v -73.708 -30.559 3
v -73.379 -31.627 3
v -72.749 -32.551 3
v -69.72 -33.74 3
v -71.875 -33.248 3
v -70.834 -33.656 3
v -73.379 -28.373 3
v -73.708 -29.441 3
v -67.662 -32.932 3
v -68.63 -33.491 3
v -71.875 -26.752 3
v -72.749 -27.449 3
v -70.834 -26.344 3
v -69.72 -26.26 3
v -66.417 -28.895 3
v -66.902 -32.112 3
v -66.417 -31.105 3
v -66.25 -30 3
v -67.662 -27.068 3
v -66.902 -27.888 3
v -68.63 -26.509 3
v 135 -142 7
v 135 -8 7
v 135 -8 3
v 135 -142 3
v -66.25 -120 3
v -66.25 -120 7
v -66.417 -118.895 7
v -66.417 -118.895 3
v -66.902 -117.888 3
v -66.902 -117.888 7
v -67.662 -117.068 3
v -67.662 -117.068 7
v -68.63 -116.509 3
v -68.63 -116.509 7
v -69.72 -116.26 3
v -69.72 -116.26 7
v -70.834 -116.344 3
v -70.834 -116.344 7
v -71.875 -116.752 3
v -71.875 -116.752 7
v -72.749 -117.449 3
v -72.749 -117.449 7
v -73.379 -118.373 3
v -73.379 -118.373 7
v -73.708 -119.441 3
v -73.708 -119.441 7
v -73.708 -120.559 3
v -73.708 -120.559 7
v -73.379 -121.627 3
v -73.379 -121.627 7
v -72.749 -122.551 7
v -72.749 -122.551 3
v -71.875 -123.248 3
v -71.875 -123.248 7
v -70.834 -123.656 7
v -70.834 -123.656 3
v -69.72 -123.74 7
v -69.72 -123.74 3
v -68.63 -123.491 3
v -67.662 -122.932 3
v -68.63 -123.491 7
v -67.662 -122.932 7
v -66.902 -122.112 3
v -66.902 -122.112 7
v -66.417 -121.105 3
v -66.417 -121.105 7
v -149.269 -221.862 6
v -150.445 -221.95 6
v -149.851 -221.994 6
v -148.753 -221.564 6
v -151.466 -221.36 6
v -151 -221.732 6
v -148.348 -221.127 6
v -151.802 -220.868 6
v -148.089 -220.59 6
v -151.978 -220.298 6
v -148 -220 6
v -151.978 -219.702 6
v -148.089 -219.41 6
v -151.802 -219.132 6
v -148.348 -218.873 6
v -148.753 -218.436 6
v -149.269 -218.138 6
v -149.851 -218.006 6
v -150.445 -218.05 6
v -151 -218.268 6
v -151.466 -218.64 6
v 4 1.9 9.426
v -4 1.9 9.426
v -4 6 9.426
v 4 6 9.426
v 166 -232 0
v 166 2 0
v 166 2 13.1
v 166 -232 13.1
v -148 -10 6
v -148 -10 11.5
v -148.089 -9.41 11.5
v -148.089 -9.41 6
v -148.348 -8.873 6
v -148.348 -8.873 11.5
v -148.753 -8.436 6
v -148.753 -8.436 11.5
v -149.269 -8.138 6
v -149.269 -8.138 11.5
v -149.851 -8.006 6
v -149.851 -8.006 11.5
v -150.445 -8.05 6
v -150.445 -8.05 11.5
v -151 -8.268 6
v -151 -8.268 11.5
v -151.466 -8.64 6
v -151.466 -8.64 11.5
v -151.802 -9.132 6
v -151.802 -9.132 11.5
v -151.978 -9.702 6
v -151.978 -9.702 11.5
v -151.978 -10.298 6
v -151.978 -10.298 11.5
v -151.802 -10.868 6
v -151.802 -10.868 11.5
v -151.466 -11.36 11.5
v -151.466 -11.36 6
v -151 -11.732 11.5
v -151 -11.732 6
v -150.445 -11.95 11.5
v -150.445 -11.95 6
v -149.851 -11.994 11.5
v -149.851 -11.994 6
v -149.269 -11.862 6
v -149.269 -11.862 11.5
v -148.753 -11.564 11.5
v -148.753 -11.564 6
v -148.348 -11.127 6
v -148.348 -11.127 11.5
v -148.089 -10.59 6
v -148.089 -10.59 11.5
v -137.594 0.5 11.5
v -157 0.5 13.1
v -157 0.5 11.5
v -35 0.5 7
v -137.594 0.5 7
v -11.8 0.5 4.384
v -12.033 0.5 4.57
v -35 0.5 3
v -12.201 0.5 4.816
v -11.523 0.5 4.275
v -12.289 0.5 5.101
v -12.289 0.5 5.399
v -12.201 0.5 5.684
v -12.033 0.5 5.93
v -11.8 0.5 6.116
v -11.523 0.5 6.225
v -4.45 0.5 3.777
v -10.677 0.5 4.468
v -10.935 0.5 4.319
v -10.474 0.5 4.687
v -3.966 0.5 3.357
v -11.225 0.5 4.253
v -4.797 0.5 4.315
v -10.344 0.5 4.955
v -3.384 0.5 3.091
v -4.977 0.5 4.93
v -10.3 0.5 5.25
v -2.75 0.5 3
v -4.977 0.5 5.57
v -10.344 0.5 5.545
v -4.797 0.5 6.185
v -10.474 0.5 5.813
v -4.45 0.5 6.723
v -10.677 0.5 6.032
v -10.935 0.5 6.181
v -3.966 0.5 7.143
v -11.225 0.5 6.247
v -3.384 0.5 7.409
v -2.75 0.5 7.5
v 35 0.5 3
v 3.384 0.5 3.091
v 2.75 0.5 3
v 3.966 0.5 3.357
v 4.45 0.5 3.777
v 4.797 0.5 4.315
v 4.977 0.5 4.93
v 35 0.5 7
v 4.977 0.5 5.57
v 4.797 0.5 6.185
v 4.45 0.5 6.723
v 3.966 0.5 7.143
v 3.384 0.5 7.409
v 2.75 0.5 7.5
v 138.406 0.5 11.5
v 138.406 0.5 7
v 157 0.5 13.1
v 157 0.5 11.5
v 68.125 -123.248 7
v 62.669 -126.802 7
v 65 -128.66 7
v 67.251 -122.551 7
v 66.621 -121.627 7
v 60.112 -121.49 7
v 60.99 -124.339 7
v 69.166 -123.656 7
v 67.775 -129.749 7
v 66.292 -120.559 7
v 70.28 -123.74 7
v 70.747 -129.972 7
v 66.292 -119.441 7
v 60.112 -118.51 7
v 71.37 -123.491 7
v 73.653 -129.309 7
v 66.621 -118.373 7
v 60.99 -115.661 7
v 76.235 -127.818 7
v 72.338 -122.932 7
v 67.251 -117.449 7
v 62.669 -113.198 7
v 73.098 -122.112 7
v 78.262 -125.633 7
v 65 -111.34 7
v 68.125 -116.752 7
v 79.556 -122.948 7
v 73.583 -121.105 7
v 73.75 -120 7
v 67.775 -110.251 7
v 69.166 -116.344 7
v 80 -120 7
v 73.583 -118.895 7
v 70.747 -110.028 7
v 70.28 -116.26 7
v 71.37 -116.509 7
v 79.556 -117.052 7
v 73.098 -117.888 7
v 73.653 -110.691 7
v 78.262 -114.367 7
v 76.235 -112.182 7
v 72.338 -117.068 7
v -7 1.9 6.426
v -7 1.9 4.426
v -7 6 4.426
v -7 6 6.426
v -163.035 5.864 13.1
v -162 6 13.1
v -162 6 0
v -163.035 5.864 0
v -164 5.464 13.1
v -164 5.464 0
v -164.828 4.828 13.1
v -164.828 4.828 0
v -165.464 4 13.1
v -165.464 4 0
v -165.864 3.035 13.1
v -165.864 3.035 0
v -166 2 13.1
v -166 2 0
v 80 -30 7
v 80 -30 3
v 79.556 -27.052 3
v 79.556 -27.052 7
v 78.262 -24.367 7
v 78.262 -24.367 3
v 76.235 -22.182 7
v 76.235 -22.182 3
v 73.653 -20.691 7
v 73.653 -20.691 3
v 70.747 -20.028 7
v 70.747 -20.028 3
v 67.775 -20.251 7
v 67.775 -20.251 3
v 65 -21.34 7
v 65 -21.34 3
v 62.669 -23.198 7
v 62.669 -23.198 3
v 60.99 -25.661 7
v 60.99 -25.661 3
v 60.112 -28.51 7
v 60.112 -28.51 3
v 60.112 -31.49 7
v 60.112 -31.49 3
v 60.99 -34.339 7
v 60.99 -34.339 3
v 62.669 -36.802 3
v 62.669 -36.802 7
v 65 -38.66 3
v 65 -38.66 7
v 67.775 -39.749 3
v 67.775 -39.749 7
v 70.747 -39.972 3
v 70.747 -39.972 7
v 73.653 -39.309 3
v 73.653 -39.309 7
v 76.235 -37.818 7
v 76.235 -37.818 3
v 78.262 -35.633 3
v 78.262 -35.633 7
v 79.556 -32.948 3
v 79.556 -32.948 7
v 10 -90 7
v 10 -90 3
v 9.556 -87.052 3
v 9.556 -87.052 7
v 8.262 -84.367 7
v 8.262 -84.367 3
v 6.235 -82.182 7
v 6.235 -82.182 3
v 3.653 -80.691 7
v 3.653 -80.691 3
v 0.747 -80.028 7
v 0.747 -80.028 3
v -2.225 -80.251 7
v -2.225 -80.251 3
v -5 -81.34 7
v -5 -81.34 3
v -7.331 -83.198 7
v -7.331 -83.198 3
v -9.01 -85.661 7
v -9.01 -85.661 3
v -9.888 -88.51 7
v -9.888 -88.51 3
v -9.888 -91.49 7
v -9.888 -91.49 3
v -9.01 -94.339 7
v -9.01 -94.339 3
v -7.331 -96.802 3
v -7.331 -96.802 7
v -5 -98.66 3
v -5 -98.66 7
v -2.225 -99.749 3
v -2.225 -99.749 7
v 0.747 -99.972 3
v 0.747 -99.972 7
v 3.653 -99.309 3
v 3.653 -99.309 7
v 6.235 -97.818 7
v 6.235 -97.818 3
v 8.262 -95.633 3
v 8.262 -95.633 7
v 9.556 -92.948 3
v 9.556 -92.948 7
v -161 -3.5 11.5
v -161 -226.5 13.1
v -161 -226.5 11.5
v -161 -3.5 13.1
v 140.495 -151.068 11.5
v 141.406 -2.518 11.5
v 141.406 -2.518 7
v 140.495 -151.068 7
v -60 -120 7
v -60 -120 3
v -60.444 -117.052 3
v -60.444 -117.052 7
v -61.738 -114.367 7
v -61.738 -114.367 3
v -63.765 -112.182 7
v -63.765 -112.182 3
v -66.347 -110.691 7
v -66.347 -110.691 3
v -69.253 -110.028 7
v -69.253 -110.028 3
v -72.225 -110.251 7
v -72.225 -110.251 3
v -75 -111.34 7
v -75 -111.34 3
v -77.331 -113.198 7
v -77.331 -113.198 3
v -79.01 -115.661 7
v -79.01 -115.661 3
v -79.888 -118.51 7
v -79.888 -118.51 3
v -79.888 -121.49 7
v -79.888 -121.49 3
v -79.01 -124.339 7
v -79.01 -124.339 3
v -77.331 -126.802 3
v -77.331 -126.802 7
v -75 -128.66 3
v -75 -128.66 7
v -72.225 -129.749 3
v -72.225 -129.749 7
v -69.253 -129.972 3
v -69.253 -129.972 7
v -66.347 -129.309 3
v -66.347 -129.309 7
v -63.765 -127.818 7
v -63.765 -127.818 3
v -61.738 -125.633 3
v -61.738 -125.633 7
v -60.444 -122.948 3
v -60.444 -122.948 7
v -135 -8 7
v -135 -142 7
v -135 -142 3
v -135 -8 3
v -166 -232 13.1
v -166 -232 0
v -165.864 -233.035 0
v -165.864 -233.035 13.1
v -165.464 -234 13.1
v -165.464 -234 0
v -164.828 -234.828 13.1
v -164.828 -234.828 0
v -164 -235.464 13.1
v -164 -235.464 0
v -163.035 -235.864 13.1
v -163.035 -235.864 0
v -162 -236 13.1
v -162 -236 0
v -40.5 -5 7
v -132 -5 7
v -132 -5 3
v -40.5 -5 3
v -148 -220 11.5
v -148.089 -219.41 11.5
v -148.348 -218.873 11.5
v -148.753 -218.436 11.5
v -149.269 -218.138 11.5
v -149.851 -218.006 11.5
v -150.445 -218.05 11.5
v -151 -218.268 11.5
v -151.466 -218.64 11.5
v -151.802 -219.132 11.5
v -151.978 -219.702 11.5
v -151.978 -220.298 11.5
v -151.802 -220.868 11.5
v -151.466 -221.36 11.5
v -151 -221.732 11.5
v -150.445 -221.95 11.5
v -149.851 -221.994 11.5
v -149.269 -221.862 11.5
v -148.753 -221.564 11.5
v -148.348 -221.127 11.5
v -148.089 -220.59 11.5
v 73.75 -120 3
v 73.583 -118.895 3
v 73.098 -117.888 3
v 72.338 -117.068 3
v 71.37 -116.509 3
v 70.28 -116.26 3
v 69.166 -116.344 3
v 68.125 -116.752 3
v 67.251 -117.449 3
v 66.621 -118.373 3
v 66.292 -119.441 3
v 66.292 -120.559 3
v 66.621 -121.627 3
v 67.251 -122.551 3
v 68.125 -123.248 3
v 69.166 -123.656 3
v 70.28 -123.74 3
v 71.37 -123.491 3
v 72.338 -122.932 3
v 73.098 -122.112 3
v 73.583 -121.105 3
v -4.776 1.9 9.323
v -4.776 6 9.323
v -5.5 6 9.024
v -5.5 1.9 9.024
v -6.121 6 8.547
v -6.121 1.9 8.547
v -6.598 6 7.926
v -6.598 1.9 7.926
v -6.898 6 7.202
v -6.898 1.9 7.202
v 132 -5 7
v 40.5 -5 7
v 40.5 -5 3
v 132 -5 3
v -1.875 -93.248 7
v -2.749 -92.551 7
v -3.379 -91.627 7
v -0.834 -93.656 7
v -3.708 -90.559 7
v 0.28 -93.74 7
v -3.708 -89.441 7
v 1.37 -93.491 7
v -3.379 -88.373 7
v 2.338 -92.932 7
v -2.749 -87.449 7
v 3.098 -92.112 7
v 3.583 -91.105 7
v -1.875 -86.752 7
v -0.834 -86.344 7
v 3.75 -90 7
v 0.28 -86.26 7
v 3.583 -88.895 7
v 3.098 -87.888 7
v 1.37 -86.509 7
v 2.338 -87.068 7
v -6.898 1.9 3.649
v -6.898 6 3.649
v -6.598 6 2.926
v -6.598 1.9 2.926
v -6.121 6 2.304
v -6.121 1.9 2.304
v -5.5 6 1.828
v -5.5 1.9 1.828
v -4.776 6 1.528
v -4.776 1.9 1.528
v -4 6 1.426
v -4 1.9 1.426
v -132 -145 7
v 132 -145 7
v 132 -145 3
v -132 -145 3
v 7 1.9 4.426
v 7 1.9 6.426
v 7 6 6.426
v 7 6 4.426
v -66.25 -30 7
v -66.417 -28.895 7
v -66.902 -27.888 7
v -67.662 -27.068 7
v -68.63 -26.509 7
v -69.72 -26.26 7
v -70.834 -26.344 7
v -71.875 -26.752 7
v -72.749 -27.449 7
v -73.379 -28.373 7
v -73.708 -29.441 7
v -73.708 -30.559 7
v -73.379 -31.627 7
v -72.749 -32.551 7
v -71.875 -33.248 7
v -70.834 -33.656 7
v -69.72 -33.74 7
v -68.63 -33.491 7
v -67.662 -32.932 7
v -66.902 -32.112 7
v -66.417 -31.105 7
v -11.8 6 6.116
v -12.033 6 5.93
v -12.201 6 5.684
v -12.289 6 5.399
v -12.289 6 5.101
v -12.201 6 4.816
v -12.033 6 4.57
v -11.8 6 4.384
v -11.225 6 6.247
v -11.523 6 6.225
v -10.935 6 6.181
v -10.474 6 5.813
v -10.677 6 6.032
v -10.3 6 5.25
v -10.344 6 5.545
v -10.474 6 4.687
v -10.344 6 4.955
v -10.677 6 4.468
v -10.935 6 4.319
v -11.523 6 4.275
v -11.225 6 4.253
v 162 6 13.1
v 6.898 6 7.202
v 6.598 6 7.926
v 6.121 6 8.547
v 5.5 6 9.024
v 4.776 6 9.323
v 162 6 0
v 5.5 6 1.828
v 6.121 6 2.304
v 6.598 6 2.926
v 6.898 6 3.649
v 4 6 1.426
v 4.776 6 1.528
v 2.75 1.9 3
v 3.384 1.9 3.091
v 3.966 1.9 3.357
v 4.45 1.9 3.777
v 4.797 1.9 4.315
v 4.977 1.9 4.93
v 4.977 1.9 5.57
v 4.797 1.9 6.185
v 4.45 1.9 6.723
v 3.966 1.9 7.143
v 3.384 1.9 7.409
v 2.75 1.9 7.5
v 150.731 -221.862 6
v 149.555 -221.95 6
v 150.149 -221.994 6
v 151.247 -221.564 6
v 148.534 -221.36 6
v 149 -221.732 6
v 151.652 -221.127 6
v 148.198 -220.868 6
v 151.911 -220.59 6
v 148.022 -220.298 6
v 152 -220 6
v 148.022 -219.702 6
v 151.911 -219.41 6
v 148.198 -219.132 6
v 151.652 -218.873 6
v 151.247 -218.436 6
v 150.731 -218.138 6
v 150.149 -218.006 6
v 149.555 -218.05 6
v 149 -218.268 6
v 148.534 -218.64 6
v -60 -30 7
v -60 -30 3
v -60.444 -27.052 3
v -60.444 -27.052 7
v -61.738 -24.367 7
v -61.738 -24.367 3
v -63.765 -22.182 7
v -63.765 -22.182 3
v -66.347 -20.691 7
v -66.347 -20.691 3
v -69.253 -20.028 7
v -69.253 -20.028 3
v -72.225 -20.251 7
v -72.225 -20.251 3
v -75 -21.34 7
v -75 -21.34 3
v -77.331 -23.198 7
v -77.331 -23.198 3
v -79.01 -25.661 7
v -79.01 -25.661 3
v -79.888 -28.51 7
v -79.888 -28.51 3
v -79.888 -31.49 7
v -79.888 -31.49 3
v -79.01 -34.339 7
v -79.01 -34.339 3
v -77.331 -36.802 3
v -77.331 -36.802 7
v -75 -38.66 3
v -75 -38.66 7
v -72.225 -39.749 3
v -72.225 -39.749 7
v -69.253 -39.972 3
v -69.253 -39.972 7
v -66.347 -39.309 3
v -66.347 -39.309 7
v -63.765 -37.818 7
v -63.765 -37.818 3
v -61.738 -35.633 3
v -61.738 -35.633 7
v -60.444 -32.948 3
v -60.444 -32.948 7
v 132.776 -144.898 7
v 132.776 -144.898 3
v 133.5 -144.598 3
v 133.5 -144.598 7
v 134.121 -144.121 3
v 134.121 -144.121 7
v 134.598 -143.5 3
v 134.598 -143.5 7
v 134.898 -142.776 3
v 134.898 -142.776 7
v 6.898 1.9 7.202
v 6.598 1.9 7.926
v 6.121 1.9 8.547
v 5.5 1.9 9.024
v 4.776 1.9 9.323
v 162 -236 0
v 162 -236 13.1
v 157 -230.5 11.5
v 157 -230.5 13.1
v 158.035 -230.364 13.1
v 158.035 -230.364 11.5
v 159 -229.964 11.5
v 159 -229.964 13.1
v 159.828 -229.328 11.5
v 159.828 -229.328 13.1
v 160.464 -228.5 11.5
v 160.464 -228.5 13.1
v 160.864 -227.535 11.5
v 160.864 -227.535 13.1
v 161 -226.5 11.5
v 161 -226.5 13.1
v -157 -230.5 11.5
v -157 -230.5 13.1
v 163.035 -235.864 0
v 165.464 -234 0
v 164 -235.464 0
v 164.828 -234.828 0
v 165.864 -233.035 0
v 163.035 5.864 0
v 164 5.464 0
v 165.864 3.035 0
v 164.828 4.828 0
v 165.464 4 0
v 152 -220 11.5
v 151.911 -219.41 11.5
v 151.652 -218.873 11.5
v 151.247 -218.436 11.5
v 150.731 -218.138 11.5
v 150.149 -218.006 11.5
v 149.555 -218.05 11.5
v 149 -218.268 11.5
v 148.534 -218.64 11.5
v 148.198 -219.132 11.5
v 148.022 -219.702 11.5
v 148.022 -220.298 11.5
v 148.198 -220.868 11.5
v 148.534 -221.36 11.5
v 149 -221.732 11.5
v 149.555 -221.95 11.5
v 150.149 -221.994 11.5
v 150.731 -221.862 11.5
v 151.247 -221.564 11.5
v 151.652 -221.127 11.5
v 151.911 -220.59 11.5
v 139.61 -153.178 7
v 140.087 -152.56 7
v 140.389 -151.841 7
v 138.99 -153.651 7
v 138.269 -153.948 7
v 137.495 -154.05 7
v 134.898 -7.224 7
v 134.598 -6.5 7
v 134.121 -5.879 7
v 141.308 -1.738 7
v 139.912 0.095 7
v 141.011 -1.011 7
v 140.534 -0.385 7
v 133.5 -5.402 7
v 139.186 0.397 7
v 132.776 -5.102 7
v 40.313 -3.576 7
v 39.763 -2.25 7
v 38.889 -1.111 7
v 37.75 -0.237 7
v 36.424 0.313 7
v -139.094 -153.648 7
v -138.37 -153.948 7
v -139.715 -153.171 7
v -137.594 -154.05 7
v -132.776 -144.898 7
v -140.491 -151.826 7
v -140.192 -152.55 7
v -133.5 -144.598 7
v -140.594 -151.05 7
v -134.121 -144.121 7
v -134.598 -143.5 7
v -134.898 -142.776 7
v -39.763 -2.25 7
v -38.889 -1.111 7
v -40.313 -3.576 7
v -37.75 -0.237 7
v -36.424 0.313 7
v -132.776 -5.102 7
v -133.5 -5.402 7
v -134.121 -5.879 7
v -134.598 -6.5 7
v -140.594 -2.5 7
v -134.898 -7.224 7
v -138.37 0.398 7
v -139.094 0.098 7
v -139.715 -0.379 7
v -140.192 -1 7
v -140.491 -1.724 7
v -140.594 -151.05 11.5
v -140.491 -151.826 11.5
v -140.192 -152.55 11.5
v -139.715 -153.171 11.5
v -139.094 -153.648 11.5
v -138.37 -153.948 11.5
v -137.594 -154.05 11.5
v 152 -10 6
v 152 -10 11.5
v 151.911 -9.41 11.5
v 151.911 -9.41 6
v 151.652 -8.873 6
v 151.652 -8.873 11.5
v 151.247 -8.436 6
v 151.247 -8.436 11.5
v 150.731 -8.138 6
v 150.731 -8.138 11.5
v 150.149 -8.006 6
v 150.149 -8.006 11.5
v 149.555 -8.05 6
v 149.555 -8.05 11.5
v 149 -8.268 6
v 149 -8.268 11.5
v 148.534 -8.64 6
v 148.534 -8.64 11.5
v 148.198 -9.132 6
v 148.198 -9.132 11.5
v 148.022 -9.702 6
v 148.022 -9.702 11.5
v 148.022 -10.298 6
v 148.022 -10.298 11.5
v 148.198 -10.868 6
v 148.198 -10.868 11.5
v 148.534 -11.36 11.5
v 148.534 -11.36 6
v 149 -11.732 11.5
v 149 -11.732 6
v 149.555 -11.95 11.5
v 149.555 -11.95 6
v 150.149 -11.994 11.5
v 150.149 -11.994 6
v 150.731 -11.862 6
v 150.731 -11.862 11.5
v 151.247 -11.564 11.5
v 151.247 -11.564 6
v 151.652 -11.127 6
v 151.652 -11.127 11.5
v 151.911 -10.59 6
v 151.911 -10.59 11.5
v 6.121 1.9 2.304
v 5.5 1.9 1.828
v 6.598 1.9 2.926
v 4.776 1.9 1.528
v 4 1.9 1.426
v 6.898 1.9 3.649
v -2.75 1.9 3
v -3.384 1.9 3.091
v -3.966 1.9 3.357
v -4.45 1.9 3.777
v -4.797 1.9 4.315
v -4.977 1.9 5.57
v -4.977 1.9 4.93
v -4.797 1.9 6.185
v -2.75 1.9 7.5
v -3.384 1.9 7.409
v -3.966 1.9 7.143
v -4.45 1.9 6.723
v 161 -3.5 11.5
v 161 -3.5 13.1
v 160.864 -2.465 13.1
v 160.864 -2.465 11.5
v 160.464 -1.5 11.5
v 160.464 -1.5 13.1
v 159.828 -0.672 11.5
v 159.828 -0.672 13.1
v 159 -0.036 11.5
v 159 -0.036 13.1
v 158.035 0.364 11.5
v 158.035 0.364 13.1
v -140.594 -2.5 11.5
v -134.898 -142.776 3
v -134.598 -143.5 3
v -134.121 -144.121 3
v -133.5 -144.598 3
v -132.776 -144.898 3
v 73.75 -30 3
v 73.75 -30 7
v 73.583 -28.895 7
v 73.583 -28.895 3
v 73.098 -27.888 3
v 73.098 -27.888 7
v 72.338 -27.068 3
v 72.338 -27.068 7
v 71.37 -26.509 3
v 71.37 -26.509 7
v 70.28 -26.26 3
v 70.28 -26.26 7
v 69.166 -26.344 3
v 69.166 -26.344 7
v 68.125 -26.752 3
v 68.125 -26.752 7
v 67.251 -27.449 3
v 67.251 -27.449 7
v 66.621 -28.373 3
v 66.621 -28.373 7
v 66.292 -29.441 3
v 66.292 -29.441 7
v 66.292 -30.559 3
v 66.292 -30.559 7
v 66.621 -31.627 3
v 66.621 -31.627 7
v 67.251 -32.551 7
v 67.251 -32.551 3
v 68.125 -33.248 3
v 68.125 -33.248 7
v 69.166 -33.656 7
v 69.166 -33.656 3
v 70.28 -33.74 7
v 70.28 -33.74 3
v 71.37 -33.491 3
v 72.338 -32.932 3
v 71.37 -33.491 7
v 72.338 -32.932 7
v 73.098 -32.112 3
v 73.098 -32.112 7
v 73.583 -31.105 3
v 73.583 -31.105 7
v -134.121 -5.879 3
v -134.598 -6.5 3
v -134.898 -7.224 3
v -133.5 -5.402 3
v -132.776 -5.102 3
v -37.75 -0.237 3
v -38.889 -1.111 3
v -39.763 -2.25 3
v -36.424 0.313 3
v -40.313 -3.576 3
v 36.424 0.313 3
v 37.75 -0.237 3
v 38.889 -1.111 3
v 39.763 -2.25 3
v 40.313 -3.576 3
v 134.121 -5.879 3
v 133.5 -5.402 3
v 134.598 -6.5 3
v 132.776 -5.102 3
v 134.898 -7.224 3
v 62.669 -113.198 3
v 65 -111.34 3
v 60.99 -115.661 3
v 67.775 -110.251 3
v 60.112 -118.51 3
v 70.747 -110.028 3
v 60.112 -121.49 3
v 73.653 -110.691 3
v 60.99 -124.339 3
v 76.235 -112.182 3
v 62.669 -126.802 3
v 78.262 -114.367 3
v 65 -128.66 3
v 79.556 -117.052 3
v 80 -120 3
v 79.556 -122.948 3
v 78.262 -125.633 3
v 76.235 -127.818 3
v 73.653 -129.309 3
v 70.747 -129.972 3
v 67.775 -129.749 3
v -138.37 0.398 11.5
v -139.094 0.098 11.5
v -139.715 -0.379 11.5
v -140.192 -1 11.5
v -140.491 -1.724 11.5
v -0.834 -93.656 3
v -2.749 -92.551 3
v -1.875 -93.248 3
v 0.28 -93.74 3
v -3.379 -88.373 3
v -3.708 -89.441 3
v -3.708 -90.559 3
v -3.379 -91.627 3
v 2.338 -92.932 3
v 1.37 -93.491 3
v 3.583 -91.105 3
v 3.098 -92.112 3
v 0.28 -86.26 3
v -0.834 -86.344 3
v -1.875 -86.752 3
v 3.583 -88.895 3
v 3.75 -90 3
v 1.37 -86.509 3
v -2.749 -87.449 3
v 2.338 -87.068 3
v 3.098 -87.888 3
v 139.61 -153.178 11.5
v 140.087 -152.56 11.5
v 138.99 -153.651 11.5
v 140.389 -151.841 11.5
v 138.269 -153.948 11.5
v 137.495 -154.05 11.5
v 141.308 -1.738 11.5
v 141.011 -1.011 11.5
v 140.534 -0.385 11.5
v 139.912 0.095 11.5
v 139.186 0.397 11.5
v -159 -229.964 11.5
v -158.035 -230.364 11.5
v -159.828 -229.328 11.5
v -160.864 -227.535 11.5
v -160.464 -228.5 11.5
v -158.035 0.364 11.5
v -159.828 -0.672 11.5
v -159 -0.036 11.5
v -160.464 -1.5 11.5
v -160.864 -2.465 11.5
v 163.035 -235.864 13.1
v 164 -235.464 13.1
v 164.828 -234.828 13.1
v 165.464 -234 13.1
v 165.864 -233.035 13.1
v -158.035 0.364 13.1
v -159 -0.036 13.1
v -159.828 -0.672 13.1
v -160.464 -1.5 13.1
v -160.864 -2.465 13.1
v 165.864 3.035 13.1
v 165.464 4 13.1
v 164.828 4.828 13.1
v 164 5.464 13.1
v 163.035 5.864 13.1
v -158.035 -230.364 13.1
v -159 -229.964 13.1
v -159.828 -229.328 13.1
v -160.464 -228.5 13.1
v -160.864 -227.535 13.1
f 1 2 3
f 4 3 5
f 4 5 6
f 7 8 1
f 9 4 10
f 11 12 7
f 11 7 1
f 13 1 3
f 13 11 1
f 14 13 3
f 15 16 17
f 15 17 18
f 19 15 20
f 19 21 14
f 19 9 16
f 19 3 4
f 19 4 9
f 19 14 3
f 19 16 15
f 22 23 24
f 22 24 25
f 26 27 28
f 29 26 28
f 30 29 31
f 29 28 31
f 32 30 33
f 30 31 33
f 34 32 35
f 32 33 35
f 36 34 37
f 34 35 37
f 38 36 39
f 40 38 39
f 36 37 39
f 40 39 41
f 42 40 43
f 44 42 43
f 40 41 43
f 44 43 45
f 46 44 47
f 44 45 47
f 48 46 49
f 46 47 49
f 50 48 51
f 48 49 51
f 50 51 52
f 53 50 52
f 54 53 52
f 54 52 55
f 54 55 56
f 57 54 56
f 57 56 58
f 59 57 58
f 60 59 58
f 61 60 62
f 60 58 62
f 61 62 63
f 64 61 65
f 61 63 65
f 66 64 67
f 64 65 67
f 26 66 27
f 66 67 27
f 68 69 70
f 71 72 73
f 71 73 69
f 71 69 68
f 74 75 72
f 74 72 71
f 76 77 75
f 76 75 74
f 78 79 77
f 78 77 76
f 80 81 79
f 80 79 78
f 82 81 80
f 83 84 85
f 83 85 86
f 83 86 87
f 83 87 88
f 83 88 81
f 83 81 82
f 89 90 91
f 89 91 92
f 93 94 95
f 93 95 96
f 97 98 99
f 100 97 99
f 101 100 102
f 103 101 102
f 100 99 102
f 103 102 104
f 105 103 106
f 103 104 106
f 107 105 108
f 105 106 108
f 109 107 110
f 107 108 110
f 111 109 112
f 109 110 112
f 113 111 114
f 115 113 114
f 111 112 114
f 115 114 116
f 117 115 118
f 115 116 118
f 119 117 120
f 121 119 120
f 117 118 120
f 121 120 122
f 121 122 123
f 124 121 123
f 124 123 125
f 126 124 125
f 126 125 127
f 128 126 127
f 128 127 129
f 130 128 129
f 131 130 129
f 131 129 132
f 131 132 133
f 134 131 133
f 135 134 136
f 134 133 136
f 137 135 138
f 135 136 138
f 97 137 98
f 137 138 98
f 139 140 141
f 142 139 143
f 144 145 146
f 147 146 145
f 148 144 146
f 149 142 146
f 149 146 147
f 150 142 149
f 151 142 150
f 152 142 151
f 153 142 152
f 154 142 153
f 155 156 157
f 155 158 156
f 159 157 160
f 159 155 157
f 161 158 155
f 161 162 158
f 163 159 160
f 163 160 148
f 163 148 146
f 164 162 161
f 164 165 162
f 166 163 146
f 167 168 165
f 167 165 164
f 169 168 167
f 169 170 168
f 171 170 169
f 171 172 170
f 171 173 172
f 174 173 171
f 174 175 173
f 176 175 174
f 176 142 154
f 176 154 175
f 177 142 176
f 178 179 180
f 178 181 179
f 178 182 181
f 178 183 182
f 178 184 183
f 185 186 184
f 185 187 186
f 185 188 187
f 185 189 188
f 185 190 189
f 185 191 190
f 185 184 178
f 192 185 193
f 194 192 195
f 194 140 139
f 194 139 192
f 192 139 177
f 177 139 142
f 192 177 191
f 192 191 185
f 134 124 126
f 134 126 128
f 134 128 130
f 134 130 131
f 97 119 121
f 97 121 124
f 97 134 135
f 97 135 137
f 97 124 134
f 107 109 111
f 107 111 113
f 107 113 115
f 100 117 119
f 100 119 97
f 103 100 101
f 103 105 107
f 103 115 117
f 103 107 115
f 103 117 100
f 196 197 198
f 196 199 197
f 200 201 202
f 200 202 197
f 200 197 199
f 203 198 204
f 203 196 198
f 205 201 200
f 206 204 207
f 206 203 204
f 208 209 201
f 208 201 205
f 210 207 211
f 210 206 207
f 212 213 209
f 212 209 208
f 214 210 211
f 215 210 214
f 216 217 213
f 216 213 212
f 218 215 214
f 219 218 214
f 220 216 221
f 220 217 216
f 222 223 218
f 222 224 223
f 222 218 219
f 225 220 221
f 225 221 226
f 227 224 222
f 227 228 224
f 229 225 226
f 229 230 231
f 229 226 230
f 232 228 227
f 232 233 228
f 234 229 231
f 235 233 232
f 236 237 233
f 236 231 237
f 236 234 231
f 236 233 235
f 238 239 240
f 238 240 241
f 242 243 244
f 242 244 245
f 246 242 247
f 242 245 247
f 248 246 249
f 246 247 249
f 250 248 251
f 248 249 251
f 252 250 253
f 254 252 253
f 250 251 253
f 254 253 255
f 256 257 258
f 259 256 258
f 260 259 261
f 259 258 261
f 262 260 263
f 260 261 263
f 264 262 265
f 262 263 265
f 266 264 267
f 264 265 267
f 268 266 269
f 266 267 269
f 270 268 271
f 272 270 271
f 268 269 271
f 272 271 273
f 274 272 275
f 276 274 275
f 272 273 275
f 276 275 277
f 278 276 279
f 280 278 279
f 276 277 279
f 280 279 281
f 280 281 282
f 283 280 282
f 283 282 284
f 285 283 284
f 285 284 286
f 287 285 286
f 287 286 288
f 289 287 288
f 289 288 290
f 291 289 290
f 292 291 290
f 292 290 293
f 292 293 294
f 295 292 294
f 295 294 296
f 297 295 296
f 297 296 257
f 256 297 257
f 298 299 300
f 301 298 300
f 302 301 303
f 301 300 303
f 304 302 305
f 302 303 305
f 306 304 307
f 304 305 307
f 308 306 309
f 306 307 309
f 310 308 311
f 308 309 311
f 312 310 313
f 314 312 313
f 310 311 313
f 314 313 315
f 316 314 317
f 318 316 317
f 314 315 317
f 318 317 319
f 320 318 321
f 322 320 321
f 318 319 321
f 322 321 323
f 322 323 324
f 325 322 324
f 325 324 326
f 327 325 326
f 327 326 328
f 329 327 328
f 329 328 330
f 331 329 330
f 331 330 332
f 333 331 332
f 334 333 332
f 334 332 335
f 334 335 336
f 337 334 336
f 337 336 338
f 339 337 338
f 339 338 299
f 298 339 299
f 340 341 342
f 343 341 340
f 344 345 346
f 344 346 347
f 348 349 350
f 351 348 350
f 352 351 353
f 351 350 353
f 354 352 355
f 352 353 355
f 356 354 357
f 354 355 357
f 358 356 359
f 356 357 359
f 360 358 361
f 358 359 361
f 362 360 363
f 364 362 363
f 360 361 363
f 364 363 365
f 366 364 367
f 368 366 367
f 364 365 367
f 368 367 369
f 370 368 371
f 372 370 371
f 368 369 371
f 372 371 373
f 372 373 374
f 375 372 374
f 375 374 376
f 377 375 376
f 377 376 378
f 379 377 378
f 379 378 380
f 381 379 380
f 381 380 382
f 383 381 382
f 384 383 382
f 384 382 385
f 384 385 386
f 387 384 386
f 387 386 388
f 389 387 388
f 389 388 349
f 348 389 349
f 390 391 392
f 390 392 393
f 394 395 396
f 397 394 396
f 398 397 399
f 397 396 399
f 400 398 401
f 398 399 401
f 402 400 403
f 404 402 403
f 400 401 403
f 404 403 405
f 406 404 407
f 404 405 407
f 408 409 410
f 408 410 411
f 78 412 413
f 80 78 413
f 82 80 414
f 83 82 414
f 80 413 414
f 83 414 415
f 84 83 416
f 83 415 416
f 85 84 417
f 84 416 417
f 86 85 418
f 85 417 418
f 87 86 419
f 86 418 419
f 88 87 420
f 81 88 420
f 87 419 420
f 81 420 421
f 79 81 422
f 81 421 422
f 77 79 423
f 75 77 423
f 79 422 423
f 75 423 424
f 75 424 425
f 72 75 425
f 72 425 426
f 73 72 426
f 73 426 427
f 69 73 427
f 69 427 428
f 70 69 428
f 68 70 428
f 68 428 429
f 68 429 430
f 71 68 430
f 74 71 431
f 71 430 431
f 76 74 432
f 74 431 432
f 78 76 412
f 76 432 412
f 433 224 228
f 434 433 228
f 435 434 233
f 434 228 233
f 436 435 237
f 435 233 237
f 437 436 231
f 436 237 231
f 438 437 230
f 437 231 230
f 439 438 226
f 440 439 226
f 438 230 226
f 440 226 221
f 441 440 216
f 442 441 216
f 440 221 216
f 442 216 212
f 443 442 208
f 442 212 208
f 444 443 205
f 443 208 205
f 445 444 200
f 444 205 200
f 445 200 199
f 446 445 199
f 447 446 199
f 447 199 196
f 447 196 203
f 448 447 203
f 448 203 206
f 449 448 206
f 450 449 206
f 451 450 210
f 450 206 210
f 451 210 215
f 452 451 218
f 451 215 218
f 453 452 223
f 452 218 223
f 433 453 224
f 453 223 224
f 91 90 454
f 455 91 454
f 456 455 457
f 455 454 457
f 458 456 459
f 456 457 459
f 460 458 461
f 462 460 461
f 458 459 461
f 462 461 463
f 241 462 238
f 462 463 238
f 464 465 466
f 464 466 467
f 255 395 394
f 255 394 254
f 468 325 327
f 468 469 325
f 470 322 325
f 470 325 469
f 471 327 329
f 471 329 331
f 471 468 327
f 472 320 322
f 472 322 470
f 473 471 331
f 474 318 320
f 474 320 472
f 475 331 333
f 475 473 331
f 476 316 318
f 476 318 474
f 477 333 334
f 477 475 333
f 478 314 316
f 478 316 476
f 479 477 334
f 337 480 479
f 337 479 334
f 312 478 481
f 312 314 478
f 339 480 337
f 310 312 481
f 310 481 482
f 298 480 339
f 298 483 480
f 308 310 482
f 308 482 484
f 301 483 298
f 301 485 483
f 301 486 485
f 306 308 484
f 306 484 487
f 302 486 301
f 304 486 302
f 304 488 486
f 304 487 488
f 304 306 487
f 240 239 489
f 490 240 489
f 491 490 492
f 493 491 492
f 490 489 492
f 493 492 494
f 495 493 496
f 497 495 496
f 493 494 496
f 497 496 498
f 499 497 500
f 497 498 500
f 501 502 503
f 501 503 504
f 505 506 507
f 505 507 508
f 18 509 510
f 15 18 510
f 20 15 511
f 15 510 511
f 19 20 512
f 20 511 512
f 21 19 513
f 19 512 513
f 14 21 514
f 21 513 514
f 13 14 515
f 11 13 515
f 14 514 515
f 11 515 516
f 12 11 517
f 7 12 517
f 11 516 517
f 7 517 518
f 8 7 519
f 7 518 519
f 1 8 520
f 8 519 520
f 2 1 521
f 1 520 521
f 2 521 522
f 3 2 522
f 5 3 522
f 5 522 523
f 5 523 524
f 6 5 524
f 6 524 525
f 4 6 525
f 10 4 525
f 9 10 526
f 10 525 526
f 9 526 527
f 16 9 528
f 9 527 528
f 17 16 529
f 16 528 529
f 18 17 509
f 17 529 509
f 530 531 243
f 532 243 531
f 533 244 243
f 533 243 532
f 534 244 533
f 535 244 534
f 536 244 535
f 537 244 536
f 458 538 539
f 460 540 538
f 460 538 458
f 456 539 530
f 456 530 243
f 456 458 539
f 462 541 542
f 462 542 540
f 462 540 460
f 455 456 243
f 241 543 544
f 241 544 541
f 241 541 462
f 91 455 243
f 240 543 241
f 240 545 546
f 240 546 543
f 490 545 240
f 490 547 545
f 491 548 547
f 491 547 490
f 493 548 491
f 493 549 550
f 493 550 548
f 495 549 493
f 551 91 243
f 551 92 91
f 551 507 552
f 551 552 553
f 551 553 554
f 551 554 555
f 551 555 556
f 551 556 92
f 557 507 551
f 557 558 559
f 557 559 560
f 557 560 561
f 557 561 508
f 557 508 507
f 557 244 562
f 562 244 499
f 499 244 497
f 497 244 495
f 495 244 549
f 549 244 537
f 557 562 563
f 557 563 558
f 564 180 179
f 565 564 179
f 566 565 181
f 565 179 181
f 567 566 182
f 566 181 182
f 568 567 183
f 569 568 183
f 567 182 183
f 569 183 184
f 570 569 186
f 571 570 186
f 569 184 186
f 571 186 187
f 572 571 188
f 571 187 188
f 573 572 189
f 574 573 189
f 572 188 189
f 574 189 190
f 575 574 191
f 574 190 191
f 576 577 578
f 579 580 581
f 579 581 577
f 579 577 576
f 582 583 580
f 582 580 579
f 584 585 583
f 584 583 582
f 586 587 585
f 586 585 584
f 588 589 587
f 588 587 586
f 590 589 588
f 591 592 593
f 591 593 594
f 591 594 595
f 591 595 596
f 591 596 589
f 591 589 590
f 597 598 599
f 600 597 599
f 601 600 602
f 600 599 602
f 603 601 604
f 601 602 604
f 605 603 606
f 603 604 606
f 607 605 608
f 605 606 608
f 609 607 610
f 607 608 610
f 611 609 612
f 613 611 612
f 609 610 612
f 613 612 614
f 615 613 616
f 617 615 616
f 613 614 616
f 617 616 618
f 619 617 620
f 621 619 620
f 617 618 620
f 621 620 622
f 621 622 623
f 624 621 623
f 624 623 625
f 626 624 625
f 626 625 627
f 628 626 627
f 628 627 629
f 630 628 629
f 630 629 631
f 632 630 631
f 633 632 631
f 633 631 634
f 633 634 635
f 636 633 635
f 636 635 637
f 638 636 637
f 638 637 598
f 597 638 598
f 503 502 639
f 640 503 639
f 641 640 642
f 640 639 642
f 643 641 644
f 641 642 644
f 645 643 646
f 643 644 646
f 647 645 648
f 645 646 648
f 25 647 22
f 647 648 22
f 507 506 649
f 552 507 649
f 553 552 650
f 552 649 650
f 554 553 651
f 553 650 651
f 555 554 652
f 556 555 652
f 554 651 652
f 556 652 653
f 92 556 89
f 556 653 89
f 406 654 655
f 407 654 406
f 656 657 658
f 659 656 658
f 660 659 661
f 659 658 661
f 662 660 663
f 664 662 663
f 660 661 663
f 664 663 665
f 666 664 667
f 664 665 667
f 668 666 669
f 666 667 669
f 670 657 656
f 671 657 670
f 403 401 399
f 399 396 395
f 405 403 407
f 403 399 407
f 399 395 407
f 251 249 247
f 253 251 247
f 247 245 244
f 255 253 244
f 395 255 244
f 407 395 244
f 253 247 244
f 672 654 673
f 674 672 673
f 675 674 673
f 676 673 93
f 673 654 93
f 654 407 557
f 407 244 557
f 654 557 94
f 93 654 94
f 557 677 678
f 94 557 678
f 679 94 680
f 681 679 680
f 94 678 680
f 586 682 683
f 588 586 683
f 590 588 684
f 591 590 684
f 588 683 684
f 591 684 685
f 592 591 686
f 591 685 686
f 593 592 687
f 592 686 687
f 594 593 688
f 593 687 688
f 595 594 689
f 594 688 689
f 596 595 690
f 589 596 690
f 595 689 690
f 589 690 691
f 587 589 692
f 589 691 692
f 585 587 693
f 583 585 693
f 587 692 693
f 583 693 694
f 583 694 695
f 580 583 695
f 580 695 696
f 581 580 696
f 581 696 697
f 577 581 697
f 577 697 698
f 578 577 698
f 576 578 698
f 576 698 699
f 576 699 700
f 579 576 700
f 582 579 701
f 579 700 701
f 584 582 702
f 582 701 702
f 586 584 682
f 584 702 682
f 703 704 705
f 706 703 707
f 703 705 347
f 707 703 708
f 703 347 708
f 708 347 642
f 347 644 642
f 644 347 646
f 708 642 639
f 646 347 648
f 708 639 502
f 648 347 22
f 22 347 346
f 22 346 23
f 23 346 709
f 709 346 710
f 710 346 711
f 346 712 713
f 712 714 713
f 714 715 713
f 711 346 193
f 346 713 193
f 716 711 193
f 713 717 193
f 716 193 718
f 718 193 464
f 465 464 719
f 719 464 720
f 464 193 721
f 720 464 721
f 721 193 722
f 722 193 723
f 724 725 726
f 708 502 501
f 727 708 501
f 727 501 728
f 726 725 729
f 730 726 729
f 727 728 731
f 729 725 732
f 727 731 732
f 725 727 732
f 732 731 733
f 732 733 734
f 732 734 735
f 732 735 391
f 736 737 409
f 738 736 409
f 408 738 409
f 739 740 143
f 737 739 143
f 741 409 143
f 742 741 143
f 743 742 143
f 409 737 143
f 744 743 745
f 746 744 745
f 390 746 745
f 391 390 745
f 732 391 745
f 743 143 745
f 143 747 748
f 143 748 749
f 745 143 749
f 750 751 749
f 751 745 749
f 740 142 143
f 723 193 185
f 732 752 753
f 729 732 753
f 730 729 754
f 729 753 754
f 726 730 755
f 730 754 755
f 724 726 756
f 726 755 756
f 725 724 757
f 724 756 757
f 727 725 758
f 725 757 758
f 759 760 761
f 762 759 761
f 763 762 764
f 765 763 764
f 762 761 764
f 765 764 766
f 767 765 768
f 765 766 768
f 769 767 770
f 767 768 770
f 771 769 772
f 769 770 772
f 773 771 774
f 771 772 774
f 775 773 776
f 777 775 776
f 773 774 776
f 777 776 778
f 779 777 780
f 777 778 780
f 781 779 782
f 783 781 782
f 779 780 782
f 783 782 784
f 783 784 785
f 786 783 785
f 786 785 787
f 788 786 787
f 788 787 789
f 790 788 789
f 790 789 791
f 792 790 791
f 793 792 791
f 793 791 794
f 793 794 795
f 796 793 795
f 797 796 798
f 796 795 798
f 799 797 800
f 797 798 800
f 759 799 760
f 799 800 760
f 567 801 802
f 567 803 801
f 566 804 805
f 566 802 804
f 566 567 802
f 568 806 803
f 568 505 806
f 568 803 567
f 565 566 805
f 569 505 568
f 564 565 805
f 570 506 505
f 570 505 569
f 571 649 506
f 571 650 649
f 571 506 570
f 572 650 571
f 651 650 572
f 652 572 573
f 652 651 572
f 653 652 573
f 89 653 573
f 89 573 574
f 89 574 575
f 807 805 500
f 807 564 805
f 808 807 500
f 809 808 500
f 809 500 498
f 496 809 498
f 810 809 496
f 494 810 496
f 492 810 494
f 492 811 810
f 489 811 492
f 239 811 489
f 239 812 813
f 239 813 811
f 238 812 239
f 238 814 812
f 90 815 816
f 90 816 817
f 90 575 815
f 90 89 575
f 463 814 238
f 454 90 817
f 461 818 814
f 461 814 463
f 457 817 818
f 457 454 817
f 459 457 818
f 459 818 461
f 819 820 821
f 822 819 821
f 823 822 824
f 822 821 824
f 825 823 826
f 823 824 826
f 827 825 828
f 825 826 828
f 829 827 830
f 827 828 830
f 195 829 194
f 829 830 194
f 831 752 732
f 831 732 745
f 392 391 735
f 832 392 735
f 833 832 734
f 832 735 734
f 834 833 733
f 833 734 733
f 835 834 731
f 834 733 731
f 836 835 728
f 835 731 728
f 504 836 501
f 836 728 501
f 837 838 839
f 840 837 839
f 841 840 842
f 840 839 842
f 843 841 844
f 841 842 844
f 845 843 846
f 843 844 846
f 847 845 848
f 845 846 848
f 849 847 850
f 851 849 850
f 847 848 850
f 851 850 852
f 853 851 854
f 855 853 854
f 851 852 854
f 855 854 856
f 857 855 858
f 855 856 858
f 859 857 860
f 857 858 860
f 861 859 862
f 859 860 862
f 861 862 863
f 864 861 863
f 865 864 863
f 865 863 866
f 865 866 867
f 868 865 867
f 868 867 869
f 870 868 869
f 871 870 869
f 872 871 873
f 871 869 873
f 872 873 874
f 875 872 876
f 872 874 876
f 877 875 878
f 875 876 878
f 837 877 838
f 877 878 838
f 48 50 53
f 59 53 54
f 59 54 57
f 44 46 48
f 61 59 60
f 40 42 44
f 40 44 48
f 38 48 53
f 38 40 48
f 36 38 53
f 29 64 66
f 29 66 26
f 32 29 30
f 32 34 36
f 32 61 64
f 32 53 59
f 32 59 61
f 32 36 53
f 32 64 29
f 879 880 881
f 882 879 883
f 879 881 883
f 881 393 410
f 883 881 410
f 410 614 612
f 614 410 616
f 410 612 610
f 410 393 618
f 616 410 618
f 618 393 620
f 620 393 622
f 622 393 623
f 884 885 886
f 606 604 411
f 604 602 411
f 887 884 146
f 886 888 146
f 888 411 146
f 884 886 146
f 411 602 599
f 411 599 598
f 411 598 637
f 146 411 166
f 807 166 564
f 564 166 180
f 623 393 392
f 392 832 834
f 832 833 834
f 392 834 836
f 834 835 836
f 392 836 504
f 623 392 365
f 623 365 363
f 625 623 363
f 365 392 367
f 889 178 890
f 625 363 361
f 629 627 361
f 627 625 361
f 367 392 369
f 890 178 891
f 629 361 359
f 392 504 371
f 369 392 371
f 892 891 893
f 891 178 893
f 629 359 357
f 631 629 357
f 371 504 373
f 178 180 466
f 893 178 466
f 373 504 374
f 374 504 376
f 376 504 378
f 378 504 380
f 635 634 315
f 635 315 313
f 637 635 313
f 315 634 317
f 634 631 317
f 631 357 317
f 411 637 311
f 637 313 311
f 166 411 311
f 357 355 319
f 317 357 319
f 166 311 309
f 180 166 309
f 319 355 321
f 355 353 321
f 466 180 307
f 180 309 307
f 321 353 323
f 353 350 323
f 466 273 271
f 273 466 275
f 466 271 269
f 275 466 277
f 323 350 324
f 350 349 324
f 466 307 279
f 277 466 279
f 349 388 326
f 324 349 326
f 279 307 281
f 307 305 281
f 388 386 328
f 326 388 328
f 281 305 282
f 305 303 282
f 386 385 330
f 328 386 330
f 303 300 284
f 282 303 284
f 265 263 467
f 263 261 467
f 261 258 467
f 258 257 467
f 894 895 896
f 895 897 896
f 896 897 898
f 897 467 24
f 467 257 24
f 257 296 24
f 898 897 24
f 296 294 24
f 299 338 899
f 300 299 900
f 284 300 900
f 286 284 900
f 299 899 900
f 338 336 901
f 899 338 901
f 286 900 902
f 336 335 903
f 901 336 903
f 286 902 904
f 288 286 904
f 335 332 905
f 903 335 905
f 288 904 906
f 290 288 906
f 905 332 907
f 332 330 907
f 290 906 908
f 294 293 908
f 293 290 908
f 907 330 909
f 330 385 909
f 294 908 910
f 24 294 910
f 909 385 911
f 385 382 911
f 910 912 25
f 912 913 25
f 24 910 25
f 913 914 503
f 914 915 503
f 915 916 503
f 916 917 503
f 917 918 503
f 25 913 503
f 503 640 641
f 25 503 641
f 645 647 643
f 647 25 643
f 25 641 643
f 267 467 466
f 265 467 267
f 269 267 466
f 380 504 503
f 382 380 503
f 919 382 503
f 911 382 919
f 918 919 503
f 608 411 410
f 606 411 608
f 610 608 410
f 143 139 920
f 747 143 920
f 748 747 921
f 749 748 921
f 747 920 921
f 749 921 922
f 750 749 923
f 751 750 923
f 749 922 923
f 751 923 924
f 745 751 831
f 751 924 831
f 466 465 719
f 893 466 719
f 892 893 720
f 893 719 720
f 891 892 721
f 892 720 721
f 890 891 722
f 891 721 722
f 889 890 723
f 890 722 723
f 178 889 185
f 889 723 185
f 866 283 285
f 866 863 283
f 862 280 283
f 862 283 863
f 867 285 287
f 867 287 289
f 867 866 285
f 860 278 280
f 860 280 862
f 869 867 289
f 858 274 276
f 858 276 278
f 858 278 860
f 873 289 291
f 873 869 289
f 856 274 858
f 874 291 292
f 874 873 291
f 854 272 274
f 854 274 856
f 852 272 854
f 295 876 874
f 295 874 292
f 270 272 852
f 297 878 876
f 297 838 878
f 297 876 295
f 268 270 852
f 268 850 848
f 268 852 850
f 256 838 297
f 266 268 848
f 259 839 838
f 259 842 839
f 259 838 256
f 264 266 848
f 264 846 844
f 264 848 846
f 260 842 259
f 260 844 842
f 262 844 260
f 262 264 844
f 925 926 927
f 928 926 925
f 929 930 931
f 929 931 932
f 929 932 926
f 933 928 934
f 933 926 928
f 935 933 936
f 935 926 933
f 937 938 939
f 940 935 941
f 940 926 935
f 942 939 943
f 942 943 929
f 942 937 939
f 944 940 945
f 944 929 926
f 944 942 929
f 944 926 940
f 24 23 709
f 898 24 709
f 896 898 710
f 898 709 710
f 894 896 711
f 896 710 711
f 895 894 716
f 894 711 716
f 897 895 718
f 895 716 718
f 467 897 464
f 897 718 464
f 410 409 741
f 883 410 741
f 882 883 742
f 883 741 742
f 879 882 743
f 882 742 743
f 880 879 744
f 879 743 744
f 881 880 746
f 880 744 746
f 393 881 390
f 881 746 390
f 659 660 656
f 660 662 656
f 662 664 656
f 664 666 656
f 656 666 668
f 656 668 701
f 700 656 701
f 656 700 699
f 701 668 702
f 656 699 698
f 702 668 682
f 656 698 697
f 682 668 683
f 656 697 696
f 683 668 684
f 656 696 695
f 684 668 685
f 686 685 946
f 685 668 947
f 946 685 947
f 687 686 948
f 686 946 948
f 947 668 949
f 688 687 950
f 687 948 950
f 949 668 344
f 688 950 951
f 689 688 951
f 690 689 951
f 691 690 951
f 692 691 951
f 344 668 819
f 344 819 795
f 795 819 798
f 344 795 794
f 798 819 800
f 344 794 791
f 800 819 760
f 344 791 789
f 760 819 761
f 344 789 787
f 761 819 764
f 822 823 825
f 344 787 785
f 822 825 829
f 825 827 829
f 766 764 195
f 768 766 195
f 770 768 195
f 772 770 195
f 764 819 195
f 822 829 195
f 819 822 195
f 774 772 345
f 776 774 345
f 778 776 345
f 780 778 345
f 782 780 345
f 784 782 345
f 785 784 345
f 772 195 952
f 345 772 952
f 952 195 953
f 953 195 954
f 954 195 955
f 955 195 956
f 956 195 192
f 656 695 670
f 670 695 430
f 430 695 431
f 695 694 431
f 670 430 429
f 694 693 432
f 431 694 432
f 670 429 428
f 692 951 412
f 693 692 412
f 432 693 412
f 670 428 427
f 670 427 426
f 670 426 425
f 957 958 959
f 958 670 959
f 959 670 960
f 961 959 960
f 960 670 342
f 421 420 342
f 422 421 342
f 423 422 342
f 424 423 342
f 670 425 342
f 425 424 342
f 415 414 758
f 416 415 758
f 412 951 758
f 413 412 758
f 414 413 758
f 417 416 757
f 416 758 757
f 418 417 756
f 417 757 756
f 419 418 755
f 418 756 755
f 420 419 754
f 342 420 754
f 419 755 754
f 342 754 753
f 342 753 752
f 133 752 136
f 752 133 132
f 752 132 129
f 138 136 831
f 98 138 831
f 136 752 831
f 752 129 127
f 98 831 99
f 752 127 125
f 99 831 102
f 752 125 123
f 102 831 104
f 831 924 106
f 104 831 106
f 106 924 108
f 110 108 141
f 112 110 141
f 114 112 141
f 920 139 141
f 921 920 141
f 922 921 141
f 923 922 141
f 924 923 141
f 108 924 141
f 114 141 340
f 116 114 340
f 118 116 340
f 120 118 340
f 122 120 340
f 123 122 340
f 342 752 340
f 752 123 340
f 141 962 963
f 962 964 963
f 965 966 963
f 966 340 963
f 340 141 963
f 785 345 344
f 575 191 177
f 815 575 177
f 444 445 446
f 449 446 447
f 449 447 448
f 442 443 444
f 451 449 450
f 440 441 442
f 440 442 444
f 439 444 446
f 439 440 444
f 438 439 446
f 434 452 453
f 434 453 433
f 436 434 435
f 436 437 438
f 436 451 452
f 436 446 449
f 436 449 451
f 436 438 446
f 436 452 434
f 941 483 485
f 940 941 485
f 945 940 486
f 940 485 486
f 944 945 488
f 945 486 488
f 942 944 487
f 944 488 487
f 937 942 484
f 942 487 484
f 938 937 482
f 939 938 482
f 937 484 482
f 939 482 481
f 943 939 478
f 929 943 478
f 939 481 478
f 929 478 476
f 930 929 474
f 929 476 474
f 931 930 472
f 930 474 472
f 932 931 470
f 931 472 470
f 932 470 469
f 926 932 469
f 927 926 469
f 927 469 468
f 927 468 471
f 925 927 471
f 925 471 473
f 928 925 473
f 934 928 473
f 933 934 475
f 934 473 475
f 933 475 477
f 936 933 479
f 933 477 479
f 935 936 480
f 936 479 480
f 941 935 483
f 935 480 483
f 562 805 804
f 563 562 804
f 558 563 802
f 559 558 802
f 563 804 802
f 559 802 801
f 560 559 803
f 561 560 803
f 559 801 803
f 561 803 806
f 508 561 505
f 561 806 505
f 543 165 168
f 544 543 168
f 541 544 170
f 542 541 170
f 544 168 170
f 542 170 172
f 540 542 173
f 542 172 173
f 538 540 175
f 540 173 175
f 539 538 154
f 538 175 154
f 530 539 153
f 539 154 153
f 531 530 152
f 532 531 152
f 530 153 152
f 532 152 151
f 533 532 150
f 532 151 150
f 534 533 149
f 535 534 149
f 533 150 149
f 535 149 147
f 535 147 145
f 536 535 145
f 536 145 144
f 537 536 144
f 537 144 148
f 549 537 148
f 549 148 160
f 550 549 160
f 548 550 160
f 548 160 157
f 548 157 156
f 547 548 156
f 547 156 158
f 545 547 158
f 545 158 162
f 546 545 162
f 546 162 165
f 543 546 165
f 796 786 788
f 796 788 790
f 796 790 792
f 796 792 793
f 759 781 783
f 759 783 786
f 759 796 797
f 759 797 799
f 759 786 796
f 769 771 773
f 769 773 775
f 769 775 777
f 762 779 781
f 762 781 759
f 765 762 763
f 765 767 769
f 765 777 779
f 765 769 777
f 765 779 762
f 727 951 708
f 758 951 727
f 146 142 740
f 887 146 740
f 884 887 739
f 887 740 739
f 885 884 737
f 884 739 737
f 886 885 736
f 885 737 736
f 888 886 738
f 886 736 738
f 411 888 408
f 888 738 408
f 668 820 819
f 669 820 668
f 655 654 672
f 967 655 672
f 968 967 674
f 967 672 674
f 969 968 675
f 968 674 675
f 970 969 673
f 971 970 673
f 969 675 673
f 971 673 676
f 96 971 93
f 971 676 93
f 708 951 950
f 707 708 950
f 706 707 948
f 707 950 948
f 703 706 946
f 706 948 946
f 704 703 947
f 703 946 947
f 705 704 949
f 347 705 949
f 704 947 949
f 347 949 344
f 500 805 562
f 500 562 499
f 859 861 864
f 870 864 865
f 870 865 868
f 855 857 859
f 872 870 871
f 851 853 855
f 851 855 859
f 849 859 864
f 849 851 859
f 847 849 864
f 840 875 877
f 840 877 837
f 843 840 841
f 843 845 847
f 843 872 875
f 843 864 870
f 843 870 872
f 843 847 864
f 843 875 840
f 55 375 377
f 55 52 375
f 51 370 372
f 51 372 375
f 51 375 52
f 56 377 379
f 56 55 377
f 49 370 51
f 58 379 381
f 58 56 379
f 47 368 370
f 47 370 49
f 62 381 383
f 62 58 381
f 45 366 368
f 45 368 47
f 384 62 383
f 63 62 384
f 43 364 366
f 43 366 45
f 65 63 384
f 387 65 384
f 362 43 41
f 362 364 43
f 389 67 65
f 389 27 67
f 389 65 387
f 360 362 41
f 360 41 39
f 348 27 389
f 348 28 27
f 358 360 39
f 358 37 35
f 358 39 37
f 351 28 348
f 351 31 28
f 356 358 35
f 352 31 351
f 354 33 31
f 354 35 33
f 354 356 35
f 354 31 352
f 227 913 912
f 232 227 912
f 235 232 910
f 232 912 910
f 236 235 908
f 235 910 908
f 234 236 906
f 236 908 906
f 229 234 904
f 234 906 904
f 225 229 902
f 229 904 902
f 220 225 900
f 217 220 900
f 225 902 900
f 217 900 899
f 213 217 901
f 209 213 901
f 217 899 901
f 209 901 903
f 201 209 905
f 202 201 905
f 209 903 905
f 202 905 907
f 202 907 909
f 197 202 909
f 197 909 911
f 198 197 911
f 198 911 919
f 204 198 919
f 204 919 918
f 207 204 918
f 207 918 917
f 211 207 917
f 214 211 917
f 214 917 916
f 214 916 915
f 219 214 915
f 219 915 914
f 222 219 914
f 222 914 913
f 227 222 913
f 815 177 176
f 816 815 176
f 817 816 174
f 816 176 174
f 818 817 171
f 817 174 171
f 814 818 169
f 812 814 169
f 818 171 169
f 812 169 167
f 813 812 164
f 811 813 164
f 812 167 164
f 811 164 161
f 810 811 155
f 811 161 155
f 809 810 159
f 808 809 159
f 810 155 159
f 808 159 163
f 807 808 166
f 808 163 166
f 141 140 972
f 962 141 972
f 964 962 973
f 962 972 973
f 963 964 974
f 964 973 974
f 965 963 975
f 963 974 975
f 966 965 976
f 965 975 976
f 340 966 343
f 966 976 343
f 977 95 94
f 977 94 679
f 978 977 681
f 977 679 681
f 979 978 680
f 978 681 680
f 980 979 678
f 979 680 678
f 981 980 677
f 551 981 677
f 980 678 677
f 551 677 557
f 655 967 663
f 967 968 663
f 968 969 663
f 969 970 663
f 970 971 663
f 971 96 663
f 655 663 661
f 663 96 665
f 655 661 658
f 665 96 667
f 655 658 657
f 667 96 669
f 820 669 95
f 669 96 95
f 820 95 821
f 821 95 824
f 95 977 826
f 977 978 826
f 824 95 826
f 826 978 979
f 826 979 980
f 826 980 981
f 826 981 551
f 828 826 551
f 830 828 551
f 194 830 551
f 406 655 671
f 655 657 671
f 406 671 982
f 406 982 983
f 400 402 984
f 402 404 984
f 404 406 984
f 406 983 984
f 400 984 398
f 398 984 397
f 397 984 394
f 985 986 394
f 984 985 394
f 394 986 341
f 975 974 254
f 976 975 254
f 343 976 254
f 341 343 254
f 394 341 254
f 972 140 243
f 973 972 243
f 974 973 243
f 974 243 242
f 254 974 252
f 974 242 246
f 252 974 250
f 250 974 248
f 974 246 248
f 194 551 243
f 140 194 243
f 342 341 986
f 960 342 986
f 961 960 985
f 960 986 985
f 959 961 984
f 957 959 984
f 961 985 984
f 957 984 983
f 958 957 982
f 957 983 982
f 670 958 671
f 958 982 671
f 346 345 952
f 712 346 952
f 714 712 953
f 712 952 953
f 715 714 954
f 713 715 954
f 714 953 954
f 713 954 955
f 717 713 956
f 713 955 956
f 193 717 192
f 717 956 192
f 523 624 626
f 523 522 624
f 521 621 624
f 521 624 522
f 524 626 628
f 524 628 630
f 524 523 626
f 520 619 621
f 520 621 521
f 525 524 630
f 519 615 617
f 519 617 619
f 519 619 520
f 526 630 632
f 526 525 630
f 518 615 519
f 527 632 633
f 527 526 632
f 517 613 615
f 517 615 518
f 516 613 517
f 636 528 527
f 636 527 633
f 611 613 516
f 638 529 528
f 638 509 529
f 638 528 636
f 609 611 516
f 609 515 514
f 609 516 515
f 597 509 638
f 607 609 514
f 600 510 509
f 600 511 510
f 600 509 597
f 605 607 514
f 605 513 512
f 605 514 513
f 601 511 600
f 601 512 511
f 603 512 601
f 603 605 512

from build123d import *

# Parameters (mm, degrees)
PAD_DEPTH       = 13.1
POCKET_DEPTH    = 10.1
POCKET006_DEPTH = 6.1
SKETCH012_R     = 10
PAD003_DEPTH    = 7
SKETCH015_R     = 1
POCKET003_DEPTH = 6
POCKET004_DEPTH = 4.1
SKETCH013_R     = 3.75
POCKET001_DEPTH = 4
POCKET002_DEPTH = 1.6
SKETCH017_R     = 2
POCKET005_DEPTH = 5.5


with BuildPart() as part:
    # Sketch → Pad (new body)
    with BuildSketch(Plane.XY):
        with BuildLine():
            Line((-162, 6), (162, 6))
            ThreePointArc((166, 2), (164.828427, 4.828427), (162, 6))
            Line((166, 2), (166, -232))
            ThreePointArc((162, -236), (164.828427, -234.828427), (166, -232))
            Line((162, -236), (-162, -236))
            ThreePointArc((-166, -232), (-164.828427, -234.828427), (-162, -236))
            Line((-166, -232), (-166, 2))
            ThreePointArc((-162, 6), (-164.828427, 4.828427), (-166, 2))
        make_face()
    extrude(amount=PAD_DEPTH)

    # Sketch001 → Pocket (cut)
    with BuildSketch(Plane.XY.offset(13.1)):
        with BuildLine():
            Line((135, -8), (135, -142))
            ThreePointArc((132, -145), (134.12132, -144.12132), (135, -142))
            Line((132, -145), (-132, -145))
            ThreePointArc((-135, -142), (-134.12132, -144.12132), (-132, -145))
            Line((-135, -142), (-135, -8))
            ThreePointArc((-131.999986, -5), (-134.121315, -5.878675), (-135, -8))
            Line((-131.999986, -5), (-40.5, -5))
            ThreePointArc((-35, 0.5), (-38.889087, -1.110913), (-40.5, -5))
            Line((35, 0.5), (-35, 0.5))
            ThreePointArc((40.5, -5), (38.889087, -1.110913), (35, 0.5))
            Line((40.5, -5), (132, -5))
            ThreePointArc((135, -8), (134.12132, -5.87868), (132, -5))
        make_face()
    extrude(amount=-POCKET_DEPTH, mode=Mode.SUBTRACT)

    # Sketch018 → Pocket006 (cut)
    with BuildSketch(Plane.XY.offset(13.1)):
        with BuildLine():
            Line((-137.593576, 0.5), (138.406481, 0.5))
            ThreePointArc((141.406424, -2.518402), (140.534297, -0.385196), (138.406481, 0.5))
            Line((141.406424, -2.518402), (140.49521, -151.068141))
            ThreePointArc((137.495267, -154.049739), (139.610071, -153.177555), (140.49521, -151.068141))
            Line((137.495267, -154.049739), (-137.593576, -154.049739))
            ThreePointArc((-140.593576, -151.049739), (-139.714896, -153.171059), (-137.593576, -154.049739))
            Line((-140.593576, -151.049739), (-140.593576, -2.5))
            ThreePointArc((-137.593576, 0.5), (-139.714896, -0.37868), (-140.593576, -2.5))
        make_face()
    extrude(amount=-POCKET006_DEPTH, mode=Mode.SUBTRACT)

    # Sketch012 → Pad003 (join)
    with BuildSketch(Plane.XY):
        with Locations((-70, -120)):
            Circle(SKETCH012_R)
        with Locations((70, -120)):
            Circle(SKETCH012_R)
        with Locations((70, -30)):
            Circle(SKETCH012_R)
        with Locations((0, -90)):
            Circle(SKETCH012_R)
        with Locations((-70, -30)):
            Circle(SKETCH012_R)
    extrude(amount=PAD003_DEPTH)

    # Sketch015 → Pocket003 (cut)
    with BuildSketch(Plane.XZ.offset(-0.5)):
        with Locations((-11.3, 5.25)):
            Circle(SKETCH015_R)
        with BuildLine():
            ThreePointArc((2.75, 3), (5, 5.25), (2.75, 7.5))
            Line((2.75, 7.5), (-2.75, 7.5))
            ThreePointArc((-2.75, 7.5), (-5, 5.25), (-2.75, 3))
            Line((-2.75, 3), (2.75, 3))
        make_face()
    extrude(amount=-POCKET003_DEPTH, mode=Mode.SUBTRACT)

    # Sketch016 → Pocket004 (cut)
    with BuildSketch(Plane.XZ.offset(-1.9)):
        with BuildLine():
            Line((-4, 9.425651), (4, 9.425651))
            ThreePointArc((7, 6.425651), (6.12132, 8.546971), (4, 9.425651))
            Line((7, 6.425651), (7, 4.425651))
            ThreePointArc((4, 1.425651), (6.12132, 2.304331), (7, 4.425651))
            Line((4, 1.425651), (-4, 1.425651))
            ThreePointArc((-7, 4.425651), (-6.12132, 2.304331), (-4, 1.425651))
            Line((-7, 4.425651), (-7, 6.425651))
            ThreePointArc((-4, 9.425651), (-6.12132, 8.546971), (-7, 6.425651))
        make_face()
    extrude(amount=-POCKET004_DEPTH, mode=Mode.SUBTRACT)

    # Sketch013 → Pocket001 (cut)
    with BuildSketch(Plane.XY.offset(7)):
        with Locations((-70, -30)):
            Circle(SKETCH013_R)
        with Locations((-70, -120)):
            Circle(SKETCH013_R)
        with Locations((70, -120)):
            Circle(SKETCH013_R)
        with Locations((70, -30)):
            Circle(SKETCH013_R)
        with Locations((0, -90)):
            Circle(SKETCH013_R)
    extrude(amount=-POCKET001_DEPTH, mode=Mode.SUBTRACT)

    # Sketch014 → Pocket002 (cut)
    with BuildSketch(Plane.XY.offset(13.1)):
        with BuildLine():
            Line((-157, 0.5), (157, 0.5))
            ThreePointArc((161, -3.5), (159.828427, -0.671573), (157, 0.5))
            Line((161, -3.5), (161, -226.5))
            ThreePointArc((157, -230.5), (159.828427, -229.328427), (161, -226.5))
            Line((157, -230.5), (-157, -230.5))
            ThreePointArc((-161, -226.5), (-159.828427, -229.328427), (-157, -230.5))
            Line((-161, -226.5), (-161, -3.5))
            ThreePointArc((-157, 0.5), (-159.828427, -0.671573), (-161, -3.5))
        make_face()
    extrude(amount=-POCKET002_DEPTH, mode=Mode.SUBTRACT)

    # Sketch017 → Pocket005 (cut)
    with BuildSketch(Plane.XY.offset(11.5)):
        with Locations((-150, -10)):
            Circle(SKETCH017_R)
        with Locations((-150, -220)):
            Circle(SKETCH017_R)
        with Locations((150, -10)):
            Circle(SKETCH017_R)
        with Locations((150, -220)):
            Circle(SKETCH017_R)
    extrude(amount=-POCKET005_DEPTH, mode=Mode.SUBTRACT)


solid = part.part
